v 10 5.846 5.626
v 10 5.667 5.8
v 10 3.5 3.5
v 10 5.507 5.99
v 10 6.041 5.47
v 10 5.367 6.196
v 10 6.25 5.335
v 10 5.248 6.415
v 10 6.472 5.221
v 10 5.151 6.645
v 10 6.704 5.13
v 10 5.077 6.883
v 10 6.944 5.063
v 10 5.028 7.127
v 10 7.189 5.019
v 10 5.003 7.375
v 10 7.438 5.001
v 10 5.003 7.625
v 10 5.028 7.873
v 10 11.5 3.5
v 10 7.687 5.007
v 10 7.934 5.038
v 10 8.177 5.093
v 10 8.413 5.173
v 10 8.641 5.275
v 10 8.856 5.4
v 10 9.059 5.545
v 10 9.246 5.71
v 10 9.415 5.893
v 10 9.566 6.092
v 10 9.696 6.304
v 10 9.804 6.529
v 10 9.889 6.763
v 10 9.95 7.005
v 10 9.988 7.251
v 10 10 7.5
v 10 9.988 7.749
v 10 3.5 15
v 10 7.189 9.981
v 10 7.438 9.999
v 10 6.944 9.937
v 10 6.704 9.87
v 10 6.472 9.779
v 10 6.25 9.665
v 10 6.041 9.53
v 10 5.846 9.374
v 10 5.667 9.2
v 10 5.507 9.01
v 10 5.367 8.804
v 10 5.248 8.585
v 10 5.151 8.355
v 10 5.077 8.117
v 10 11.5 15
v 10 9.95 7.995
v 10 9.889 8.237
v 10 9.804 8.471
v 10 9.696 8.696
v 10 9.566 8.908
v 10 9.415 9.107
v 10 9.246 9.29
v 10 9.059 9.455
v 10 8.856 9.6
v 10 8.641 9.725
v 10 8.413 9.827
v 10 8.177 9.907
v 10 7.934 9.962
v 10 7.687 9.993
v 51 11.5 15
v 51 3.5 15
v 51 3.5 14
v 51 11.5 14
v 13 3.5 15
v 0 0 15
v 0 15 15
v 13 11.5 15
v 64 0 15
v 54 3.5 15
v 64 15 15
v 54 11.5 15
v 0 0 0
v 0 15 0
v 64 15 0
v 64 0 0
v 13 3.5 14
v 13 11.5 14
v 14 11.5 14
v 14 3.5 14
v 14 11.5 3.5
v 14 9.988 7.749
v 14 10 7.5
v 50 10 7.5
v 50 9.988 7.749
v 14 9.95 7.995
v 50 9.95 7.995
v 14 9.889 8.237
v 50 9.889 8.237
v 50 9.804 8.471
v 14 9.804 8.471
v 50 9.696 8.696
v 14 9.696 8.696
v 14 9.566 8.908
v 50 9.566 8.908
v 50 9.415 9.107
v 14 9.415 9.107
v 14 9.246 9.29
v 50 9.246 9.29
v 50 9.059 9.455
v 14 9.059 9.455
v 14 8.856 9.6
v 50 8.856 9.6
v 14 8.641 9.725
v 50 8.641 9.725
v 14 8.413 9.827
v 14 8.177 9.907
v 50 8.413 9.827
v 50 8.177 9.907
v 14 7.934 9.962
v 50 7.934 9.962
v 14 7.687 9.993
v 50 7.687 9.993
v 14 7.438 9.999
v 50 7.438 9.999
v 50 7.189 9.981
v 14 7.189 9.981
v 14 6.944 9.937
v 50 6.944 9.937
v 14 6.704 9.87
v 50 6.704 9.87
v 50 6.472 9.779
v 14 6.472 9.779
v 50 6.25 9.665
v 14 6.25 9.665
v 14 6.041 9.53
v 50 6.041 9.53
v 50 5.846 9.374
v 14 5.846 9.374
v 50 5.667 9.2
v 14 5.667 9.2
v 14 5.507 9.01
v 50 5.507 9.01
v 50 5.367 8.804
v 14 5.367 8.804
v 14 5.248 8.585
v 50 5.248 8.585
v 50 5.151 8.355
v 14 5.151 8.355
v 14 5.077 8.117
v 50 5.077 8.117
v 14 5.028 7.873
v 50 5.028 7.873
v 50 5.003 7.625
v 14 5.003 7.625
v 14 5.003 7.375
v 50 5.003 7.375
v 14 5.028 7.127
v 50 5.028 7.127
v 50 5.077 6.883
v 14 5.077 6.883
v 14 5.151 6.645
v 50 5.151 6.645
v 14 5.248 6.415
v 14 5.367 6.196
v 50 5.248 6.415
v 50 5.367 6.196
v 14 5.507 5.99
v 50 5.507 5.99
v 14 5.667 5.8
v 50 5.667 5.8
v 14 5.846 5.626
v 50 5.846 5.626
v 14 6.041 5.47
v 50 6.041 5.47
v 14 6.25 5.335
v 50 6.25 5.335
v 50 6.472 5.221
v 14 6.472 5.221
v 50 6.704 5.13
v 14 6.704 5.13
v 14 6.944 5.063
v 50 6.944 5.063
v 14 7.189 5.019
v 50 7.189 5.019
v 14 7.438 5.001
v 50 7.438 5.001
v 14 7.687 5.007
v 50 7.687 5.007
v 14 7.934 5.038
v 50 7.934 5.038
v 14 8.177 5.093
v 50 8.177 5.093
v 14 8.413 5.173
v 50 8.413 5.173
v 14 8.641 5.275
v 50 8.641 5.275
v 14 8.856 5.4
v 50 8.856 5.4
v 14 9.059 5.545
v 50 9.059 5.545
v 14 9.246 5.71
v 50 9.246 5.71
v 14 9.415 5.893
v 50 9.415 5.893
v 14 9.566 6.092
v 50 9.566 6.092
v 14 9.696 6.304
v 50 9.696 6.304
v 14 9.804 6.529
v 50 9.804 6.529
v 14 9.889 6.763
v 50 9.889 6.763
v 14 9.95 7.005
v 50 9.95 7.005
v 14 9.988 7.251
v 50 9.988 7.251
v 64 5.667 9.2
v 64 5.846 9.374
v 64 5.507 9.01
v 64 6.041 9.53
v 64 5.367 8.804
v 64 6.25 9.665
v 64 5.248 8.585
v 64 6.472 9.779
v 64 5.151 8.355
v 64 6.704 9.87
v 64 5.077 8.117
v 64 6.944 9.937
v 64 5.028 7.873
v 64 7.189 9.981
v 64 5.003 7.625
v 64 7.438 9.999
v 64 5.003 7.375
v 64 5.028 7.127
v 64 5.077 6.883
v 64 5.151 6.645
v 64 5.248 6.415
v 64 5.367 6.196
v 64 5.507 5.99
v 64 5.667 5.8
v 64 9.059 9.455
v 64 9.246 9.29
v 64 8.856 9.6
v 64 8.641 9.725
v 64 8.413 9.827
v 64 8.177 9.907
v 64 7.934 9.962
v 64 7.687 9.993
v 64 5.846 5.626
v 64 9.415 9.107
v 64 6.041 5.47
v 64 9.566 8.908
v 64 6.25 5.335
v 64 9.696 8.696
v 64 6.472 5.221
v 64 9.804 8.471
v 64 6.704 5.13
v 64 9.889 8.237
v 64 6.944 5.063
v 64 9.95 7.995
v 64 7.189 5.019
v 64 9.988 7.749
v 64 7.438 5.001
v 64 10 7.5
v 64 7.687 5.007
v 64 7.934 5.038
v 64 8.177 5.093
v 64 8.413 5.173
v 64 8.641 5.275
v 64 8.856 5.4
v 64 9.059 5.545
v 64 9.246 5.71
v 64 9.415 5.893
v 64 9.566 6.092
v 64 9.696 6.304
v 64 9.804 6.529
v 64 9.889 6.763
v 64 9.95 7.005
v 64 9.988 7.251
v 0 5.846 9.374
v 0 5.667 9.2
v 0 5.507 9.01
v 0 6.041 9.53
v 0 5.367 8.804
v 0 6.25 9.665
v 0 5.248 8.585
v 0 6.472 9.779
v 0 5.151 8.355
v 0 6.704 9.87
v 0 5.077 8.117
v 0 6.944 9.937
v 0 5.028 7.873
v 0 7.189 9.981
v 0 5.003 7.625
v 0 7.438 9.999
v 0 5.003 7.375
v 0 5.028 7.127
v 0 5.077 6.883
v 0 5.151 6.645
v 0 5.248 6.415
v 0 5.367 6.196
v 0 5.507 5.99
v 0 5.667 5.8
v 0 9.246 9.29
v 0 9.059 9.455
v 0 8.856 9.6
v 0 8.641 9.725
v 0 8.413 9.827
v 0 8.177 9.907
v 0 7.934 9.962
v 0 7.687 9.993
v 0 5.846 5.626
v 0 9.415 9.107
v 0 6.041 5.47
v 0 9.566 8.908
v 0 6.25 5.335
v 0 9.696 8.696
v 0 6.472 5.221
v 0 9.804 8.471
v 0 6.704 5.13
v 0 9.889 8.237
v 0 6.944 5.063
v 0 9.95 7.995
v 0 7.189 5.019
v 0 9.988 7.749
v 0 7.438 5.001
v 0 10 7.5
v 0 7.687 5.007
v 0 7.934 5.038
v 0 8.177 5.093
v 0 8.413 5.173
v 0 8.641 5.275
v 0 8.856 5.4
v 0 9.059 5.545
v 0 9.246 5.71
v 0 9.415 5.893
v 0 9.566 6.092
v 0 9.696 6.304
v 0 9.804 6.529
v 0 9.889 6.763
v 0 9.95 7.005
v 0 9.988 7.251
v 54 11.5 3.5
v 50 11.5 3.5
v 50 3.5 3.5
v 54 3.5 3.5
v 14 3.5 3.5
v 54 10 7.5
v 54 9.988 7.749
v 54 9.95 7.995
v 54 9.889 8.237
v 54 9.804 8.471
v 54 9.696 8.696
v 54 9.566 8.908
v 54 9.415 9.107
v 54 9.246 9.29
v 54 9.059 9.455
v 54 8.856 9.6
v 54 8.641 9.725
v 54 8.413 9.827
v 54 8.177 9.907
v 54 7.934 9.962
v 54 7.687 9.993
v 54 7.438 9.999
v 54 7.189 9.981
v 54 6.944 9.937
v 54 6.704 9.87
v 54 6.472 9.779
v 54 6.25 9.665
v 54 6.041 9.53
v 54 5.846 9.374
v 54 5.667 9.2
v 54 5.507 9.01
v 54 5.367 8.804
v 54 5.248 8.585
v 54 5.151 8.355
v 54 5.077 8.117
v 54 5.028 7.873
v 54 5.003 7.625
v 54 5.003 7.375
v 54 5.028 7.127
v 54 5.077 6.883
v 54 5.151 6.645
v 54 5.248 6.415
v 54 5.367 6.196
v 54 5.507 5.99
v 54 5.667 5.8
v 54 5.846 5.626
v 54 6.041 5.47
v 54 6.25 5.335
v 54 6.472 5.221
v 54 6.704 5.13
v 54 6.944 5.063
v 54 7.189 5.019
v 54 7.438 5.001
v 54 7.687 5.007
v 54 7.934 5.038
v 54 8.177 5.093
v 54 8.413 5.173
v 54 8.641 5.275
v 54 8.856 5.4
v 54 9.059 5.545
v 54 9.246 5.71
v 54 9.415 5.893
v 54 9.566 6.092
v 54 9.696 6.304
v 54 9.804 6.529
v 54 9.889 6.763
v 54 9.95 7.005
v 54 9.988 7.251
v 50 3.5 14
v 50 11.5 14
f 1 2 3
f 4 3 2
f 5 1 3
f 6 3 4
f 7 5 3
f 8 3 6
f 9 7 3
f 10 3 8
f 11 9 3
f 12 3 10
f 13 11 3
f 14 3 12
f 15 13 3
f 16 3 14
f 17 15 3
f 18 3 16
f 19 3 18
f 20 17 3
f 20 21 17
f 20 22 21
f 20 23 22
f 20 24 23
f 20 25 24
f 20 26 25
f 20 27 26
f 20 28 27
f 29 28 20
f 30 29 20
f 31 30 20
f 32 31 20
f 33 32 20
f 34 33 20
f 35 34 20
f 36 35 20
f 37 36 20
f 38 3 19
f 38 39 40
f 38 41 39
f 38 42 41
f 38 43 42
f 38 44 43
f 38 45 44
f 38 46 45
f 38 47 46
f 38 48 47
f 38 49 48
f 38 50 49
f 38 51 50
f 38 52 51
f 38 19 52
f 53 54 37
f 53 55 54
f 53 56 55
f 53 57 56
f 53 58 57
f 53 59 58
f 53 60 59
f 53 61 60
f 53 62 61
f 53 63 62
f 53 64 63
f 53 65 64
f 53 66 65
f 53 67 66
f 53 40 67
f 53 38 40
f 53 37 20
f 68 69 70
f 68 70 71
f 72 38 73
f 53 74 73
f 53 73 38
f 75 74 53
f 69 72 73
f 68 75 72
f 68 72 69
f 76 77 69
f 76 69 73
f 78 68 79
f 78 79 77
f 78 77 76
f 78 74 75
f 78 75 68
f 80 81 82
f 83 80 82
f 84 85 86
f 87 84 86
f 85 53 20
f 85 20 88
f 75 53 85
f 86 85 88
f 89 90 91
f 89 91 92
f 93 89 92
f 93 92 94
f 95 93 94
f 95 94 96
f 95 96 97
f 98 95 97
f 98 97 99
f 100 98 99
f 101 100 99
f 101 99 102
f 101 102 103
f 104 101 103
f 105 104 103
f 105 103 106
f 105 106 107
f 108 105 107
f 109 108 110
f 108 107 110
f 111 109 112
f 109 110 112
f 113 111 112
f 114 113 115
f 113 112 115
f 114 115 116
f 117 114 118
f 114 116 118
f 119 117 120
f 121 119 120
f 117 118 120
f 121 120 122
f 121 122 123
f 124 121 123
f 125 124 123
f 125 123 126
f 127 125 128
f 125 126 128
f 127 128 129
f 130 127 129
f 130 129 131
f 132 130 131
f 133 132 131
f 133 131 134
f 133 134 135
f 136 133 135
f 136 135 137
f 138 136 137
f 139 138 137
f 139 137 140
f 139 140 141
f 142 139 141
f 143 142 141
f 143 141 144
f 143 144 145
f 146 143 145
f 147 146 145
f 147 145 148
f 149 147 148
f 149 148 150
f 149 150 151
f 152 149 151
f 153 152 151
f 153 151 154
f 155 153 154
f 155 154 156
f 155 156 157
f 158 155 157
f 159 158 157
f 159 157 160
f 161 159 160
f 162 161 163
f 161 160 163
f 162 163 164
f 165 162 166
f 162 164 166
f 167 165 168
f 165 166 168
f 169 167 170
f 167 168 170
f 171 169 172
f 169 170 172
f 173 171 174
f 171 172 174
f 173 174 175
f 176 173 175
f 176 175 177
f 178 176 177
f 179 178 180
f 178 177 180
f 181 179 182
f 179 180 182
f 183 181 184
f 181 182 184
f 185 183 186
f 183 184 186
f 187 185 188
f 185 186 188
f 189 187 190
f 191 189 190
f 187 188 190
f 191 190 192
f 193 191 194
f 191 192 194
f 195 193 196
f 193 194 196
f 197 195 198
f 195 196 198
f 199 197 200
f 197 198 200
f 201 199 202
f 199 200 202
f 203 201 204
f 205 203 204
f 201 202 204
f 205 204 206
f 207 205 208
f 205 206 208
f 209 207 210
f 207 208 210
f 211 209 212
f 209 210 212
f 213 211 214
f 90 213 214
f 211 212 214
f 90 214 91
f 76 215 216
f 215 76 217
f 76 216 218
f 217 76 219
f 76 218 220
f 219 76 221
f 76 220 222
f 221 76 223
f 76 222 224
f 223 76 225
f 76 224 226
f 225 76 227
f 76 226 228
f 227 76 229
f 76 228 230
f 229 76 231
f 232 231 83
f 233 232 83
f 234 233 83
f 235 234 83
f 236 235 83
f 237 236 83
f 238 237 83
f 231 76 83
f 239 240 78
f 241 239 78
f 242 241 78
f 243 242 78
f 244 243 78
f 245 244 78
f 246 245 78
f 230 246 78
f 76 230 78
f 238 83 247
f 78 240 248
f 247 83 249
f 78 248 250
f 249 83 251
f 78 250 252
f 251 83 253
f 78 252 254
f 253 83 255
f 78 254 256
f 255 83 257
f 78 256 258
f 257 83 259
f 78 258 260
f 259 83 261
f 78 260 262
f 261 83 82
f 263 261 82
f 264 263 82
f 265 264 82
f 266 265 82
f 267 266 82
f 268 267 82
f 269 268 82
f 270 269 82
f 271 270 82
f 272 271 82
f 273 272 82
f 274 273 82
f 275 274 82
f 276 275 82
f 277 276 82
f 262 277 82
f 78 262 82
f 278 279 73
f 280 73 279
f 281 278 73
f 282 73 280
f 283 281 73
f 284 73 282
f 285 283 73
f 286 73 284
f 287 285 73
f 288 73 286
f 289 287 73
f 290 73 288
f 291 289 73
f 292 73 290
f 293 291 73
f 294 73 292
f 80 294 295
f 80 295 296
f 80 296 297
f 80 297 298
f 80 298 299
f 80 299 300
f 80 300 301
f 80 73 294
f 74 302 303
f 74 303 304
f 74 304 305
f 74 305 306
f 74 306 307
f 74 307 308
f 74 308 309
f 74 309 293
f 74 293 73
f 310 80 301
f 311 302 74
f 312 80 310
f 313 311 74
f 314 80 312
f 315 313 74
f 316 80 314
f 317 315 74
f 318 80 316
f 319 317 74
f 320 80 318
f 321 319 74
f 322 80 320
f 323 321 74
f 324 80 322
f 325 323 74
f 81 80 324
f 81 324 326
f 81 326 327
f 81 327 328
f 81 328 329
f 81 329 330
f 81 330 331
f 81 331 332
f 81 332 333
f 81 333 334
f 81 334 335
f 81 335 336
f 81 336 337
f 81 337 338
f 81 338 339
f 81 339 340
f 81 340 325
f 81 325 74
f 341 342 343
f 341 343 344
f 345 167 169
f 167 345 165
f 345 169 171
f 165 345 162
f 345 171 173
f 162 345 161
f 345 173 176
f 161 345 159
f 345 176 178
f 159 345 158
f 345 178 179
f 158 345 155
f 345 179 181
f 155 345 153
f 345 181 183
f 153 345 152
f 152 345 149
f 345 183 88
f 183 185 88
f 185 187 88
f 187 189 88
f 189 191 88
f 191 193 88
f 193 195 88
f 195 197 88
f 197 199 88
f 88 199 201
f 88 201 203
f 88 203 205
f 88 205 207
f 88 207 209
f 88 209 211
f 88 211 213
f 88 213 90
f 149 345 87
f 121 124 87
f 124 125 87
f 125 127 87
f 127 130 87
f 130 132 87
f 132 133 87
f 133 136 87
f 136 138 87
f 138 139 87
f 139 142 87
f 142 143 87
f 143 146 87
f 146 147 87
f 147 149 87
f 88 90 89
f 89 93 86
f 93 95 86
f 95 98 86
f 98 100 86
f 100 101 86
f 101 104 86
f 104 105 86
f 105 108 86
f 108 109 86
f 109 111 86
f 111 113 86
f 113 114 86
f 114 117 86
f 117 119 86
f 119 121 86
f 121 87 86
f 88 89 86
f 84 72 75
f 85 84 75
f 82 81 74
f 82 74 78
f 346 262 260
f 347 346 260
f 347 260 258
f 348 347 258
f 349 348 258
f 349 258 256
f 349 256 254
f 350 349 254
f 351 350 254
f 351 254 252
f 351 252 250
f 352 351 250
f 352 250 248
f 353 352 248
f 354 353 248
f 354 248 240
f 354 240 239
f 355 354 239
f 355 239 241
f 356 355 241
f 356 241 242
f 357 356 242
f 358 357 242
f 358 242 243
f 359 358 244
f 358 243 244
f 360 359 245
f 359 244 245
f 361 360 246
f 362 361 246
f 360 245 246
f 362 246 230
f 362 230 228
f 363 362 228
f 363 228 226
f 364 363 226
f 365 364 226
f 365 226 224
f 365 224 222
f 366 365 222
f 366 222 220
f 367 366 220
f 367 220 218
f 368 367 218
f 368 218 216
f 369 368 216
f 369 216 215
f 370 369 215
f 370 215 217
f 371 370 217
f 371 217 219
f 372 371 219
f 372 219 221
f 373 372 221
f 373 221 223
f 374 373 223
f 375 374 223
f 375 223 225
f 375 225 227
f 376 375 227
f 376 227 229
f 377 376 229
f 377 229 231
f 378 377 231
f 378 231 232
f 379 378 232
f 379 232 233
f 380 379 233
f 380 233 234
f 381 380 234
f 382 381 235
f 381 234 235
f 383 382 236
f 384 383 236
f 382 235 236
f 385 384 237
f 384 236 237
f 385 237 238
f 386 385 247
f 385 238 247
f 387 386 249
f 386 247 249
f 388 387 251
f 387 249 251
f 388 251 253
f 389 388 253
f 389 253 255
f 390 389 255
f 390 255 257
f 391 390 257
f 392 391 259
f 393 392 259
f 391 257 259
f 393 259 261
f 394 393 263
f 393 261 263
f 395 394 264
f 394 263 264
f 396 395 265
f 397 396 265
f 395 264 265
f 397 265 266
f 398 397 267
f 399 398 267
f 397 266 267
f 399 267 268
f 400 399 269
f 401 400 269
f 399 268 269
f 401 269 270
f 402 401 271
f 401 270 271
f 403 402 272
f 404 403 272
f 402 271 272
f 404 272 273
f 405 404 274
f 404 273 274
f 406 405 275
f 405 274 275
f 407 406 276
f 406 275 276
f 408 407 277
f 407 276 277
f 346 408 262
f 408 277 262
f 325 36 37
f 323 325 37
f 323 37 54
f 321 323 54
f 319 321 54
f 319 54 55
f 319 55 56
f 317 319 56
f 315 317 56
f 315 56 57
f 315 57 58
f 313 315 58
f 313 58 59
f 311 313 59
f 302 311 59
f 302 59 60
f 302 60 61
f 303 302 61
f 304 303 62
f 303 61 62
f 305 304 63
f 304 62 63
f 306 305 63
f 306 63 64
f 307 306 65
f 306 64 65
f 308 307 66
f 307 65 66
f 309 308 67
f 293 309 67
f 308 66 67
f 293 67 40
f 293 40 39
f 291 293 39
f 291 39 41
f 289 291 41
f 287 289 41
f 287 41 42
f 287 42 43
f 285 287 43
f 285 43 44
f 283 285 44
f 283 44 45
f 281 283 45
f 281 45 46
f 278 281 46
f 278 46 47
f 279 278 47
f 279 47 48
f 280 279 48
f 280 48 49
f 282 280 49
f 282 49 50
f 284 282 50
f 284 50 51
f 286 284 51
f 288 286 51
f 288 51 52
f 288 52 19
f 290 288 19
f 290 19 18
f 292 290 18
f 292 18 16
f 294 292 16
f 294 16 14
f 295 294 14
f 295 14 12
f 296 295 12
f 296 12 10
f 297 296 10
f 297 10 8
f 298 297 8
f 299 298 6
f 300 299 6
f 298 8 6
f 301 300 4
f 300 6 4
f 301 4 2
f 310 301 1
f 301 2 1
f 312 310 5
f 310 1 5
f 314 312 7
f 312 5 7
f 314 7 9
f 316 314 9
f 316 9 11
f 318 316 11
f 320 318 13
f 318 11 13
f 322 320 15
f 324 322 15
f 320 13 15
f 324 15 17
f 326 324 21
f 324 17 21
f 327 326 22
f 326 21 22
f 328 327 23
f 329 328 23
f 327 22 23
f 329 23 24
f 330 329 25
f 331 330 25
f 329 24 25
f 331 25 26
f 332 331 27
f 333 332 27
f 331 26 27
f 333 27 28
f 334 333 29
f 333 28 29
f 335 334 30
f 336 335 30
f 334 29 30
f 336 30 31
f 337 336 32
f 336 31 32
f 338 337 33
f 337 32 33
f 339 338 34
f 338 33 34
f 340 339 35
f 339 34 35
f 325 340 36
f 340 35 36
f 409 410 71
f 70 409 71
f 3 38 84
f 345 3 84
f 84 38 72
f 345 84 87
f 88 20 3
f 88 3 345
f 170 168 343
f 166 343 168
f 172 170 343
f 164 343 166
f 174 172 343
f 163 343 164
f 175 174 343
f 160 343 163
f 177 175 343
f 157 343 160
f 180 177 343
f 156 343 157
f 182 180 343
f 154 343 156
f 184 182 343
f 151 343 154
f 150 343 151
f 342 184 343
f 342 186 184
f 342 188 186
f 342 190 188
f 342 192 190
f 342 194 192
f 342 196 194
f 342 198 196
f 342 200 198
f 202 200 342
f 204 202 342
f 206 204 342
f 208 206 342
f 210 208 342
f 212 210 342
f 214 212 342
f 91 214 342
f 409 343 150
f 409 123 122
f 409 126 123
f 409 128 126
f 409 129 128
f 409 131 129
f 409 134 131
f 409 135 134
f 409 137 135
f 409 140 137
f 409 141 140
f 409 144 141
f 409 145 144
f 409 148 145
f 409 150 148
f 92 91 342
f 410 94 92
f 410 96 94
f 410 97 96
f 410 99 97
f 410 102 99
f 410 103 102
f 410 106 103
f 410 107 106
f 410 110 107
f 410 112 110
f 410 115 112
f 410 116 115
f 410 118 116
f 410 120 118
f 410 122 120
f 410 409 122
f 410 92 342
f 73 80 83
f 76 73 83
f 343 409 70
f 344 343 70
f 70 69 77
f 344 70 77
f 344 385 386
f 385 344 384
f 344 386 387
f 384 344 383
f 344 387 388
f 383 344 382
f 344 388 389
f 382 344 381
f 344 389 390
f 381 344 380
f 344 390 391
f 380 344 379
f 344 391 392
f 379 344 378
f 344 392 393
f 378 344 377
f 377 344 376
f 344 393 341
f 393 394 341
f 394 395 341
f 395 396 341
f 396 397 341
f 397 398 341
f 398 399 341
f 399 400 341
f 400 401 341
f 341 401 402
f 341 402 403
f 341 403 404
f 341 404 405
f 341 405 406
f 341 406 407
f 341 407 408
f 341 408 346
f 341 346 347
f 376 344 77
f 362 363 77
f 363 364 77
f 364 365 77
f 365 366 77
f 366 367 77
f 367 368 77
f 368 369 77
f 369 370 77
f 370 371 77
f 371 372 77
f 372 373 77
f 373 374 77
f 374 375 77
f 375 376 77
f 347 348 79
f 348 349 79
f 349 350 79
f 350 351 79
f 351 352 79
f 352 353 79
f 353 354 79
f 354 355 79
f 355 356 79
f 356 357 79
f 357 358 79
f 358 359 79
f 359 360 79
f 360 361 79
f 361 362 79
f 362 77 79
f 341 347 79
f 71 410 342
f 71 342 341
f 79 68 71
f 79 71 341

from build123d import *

# Parameters (mm, degrees)
F0_W     = 64
F0_H     = 15
F1_DEPTH = 15
F2_R     = 2.5
F3_DEPTH = 64.001
F4_W     = 4
F4_H     = 8
F5_DEPTH = 11.5
F6_W     = 1
F6_H     = 8
F7_DEPTH = 1


with BuildPart() as f1:
    # F0 (on Top) → F1 (new body)
    with BuildSketch(Plane.XY):
        with Locations((32, 7.5)):
            Rectangle(F0_W, F0_H)
    extrude(amount=F1_DEPTH)

    # F2 (on face) → F3 (cut, through all)
    with BuildSketch(Plane.YZ.offset(64)):
        with Locations((7.5, 7.5)):
            Circle(F2_R)
    extrude(amount=-F3_DEPTH, mode=Mode.SUBTRACT)

    # F4 (on face) → F5 (cut)
    with BuildSketch(Plane.XY.offset(15)):
        with Locations((12, 7.5)):
            Rectangle(F4_W, F4_H)
        with Locations((52, 7.5)):
            Rectangle(F4_W, F4_H)
    extrude(amount=-F5_DEPTH, mode=Mode.SUBTRACT)

    # F6 (on face) → F7 (join)
    with BuildSketch(Plane.XY.offset(15)):
        with Locations((13.5, 7.5)):
            Rectangle(F6_W, F6_H)
        with Locations((50.5, 7.5)):
            Rectangle(F6_W, F6_H)
    extrude(amount=-F7_DEPTH)


solid = f1.part
